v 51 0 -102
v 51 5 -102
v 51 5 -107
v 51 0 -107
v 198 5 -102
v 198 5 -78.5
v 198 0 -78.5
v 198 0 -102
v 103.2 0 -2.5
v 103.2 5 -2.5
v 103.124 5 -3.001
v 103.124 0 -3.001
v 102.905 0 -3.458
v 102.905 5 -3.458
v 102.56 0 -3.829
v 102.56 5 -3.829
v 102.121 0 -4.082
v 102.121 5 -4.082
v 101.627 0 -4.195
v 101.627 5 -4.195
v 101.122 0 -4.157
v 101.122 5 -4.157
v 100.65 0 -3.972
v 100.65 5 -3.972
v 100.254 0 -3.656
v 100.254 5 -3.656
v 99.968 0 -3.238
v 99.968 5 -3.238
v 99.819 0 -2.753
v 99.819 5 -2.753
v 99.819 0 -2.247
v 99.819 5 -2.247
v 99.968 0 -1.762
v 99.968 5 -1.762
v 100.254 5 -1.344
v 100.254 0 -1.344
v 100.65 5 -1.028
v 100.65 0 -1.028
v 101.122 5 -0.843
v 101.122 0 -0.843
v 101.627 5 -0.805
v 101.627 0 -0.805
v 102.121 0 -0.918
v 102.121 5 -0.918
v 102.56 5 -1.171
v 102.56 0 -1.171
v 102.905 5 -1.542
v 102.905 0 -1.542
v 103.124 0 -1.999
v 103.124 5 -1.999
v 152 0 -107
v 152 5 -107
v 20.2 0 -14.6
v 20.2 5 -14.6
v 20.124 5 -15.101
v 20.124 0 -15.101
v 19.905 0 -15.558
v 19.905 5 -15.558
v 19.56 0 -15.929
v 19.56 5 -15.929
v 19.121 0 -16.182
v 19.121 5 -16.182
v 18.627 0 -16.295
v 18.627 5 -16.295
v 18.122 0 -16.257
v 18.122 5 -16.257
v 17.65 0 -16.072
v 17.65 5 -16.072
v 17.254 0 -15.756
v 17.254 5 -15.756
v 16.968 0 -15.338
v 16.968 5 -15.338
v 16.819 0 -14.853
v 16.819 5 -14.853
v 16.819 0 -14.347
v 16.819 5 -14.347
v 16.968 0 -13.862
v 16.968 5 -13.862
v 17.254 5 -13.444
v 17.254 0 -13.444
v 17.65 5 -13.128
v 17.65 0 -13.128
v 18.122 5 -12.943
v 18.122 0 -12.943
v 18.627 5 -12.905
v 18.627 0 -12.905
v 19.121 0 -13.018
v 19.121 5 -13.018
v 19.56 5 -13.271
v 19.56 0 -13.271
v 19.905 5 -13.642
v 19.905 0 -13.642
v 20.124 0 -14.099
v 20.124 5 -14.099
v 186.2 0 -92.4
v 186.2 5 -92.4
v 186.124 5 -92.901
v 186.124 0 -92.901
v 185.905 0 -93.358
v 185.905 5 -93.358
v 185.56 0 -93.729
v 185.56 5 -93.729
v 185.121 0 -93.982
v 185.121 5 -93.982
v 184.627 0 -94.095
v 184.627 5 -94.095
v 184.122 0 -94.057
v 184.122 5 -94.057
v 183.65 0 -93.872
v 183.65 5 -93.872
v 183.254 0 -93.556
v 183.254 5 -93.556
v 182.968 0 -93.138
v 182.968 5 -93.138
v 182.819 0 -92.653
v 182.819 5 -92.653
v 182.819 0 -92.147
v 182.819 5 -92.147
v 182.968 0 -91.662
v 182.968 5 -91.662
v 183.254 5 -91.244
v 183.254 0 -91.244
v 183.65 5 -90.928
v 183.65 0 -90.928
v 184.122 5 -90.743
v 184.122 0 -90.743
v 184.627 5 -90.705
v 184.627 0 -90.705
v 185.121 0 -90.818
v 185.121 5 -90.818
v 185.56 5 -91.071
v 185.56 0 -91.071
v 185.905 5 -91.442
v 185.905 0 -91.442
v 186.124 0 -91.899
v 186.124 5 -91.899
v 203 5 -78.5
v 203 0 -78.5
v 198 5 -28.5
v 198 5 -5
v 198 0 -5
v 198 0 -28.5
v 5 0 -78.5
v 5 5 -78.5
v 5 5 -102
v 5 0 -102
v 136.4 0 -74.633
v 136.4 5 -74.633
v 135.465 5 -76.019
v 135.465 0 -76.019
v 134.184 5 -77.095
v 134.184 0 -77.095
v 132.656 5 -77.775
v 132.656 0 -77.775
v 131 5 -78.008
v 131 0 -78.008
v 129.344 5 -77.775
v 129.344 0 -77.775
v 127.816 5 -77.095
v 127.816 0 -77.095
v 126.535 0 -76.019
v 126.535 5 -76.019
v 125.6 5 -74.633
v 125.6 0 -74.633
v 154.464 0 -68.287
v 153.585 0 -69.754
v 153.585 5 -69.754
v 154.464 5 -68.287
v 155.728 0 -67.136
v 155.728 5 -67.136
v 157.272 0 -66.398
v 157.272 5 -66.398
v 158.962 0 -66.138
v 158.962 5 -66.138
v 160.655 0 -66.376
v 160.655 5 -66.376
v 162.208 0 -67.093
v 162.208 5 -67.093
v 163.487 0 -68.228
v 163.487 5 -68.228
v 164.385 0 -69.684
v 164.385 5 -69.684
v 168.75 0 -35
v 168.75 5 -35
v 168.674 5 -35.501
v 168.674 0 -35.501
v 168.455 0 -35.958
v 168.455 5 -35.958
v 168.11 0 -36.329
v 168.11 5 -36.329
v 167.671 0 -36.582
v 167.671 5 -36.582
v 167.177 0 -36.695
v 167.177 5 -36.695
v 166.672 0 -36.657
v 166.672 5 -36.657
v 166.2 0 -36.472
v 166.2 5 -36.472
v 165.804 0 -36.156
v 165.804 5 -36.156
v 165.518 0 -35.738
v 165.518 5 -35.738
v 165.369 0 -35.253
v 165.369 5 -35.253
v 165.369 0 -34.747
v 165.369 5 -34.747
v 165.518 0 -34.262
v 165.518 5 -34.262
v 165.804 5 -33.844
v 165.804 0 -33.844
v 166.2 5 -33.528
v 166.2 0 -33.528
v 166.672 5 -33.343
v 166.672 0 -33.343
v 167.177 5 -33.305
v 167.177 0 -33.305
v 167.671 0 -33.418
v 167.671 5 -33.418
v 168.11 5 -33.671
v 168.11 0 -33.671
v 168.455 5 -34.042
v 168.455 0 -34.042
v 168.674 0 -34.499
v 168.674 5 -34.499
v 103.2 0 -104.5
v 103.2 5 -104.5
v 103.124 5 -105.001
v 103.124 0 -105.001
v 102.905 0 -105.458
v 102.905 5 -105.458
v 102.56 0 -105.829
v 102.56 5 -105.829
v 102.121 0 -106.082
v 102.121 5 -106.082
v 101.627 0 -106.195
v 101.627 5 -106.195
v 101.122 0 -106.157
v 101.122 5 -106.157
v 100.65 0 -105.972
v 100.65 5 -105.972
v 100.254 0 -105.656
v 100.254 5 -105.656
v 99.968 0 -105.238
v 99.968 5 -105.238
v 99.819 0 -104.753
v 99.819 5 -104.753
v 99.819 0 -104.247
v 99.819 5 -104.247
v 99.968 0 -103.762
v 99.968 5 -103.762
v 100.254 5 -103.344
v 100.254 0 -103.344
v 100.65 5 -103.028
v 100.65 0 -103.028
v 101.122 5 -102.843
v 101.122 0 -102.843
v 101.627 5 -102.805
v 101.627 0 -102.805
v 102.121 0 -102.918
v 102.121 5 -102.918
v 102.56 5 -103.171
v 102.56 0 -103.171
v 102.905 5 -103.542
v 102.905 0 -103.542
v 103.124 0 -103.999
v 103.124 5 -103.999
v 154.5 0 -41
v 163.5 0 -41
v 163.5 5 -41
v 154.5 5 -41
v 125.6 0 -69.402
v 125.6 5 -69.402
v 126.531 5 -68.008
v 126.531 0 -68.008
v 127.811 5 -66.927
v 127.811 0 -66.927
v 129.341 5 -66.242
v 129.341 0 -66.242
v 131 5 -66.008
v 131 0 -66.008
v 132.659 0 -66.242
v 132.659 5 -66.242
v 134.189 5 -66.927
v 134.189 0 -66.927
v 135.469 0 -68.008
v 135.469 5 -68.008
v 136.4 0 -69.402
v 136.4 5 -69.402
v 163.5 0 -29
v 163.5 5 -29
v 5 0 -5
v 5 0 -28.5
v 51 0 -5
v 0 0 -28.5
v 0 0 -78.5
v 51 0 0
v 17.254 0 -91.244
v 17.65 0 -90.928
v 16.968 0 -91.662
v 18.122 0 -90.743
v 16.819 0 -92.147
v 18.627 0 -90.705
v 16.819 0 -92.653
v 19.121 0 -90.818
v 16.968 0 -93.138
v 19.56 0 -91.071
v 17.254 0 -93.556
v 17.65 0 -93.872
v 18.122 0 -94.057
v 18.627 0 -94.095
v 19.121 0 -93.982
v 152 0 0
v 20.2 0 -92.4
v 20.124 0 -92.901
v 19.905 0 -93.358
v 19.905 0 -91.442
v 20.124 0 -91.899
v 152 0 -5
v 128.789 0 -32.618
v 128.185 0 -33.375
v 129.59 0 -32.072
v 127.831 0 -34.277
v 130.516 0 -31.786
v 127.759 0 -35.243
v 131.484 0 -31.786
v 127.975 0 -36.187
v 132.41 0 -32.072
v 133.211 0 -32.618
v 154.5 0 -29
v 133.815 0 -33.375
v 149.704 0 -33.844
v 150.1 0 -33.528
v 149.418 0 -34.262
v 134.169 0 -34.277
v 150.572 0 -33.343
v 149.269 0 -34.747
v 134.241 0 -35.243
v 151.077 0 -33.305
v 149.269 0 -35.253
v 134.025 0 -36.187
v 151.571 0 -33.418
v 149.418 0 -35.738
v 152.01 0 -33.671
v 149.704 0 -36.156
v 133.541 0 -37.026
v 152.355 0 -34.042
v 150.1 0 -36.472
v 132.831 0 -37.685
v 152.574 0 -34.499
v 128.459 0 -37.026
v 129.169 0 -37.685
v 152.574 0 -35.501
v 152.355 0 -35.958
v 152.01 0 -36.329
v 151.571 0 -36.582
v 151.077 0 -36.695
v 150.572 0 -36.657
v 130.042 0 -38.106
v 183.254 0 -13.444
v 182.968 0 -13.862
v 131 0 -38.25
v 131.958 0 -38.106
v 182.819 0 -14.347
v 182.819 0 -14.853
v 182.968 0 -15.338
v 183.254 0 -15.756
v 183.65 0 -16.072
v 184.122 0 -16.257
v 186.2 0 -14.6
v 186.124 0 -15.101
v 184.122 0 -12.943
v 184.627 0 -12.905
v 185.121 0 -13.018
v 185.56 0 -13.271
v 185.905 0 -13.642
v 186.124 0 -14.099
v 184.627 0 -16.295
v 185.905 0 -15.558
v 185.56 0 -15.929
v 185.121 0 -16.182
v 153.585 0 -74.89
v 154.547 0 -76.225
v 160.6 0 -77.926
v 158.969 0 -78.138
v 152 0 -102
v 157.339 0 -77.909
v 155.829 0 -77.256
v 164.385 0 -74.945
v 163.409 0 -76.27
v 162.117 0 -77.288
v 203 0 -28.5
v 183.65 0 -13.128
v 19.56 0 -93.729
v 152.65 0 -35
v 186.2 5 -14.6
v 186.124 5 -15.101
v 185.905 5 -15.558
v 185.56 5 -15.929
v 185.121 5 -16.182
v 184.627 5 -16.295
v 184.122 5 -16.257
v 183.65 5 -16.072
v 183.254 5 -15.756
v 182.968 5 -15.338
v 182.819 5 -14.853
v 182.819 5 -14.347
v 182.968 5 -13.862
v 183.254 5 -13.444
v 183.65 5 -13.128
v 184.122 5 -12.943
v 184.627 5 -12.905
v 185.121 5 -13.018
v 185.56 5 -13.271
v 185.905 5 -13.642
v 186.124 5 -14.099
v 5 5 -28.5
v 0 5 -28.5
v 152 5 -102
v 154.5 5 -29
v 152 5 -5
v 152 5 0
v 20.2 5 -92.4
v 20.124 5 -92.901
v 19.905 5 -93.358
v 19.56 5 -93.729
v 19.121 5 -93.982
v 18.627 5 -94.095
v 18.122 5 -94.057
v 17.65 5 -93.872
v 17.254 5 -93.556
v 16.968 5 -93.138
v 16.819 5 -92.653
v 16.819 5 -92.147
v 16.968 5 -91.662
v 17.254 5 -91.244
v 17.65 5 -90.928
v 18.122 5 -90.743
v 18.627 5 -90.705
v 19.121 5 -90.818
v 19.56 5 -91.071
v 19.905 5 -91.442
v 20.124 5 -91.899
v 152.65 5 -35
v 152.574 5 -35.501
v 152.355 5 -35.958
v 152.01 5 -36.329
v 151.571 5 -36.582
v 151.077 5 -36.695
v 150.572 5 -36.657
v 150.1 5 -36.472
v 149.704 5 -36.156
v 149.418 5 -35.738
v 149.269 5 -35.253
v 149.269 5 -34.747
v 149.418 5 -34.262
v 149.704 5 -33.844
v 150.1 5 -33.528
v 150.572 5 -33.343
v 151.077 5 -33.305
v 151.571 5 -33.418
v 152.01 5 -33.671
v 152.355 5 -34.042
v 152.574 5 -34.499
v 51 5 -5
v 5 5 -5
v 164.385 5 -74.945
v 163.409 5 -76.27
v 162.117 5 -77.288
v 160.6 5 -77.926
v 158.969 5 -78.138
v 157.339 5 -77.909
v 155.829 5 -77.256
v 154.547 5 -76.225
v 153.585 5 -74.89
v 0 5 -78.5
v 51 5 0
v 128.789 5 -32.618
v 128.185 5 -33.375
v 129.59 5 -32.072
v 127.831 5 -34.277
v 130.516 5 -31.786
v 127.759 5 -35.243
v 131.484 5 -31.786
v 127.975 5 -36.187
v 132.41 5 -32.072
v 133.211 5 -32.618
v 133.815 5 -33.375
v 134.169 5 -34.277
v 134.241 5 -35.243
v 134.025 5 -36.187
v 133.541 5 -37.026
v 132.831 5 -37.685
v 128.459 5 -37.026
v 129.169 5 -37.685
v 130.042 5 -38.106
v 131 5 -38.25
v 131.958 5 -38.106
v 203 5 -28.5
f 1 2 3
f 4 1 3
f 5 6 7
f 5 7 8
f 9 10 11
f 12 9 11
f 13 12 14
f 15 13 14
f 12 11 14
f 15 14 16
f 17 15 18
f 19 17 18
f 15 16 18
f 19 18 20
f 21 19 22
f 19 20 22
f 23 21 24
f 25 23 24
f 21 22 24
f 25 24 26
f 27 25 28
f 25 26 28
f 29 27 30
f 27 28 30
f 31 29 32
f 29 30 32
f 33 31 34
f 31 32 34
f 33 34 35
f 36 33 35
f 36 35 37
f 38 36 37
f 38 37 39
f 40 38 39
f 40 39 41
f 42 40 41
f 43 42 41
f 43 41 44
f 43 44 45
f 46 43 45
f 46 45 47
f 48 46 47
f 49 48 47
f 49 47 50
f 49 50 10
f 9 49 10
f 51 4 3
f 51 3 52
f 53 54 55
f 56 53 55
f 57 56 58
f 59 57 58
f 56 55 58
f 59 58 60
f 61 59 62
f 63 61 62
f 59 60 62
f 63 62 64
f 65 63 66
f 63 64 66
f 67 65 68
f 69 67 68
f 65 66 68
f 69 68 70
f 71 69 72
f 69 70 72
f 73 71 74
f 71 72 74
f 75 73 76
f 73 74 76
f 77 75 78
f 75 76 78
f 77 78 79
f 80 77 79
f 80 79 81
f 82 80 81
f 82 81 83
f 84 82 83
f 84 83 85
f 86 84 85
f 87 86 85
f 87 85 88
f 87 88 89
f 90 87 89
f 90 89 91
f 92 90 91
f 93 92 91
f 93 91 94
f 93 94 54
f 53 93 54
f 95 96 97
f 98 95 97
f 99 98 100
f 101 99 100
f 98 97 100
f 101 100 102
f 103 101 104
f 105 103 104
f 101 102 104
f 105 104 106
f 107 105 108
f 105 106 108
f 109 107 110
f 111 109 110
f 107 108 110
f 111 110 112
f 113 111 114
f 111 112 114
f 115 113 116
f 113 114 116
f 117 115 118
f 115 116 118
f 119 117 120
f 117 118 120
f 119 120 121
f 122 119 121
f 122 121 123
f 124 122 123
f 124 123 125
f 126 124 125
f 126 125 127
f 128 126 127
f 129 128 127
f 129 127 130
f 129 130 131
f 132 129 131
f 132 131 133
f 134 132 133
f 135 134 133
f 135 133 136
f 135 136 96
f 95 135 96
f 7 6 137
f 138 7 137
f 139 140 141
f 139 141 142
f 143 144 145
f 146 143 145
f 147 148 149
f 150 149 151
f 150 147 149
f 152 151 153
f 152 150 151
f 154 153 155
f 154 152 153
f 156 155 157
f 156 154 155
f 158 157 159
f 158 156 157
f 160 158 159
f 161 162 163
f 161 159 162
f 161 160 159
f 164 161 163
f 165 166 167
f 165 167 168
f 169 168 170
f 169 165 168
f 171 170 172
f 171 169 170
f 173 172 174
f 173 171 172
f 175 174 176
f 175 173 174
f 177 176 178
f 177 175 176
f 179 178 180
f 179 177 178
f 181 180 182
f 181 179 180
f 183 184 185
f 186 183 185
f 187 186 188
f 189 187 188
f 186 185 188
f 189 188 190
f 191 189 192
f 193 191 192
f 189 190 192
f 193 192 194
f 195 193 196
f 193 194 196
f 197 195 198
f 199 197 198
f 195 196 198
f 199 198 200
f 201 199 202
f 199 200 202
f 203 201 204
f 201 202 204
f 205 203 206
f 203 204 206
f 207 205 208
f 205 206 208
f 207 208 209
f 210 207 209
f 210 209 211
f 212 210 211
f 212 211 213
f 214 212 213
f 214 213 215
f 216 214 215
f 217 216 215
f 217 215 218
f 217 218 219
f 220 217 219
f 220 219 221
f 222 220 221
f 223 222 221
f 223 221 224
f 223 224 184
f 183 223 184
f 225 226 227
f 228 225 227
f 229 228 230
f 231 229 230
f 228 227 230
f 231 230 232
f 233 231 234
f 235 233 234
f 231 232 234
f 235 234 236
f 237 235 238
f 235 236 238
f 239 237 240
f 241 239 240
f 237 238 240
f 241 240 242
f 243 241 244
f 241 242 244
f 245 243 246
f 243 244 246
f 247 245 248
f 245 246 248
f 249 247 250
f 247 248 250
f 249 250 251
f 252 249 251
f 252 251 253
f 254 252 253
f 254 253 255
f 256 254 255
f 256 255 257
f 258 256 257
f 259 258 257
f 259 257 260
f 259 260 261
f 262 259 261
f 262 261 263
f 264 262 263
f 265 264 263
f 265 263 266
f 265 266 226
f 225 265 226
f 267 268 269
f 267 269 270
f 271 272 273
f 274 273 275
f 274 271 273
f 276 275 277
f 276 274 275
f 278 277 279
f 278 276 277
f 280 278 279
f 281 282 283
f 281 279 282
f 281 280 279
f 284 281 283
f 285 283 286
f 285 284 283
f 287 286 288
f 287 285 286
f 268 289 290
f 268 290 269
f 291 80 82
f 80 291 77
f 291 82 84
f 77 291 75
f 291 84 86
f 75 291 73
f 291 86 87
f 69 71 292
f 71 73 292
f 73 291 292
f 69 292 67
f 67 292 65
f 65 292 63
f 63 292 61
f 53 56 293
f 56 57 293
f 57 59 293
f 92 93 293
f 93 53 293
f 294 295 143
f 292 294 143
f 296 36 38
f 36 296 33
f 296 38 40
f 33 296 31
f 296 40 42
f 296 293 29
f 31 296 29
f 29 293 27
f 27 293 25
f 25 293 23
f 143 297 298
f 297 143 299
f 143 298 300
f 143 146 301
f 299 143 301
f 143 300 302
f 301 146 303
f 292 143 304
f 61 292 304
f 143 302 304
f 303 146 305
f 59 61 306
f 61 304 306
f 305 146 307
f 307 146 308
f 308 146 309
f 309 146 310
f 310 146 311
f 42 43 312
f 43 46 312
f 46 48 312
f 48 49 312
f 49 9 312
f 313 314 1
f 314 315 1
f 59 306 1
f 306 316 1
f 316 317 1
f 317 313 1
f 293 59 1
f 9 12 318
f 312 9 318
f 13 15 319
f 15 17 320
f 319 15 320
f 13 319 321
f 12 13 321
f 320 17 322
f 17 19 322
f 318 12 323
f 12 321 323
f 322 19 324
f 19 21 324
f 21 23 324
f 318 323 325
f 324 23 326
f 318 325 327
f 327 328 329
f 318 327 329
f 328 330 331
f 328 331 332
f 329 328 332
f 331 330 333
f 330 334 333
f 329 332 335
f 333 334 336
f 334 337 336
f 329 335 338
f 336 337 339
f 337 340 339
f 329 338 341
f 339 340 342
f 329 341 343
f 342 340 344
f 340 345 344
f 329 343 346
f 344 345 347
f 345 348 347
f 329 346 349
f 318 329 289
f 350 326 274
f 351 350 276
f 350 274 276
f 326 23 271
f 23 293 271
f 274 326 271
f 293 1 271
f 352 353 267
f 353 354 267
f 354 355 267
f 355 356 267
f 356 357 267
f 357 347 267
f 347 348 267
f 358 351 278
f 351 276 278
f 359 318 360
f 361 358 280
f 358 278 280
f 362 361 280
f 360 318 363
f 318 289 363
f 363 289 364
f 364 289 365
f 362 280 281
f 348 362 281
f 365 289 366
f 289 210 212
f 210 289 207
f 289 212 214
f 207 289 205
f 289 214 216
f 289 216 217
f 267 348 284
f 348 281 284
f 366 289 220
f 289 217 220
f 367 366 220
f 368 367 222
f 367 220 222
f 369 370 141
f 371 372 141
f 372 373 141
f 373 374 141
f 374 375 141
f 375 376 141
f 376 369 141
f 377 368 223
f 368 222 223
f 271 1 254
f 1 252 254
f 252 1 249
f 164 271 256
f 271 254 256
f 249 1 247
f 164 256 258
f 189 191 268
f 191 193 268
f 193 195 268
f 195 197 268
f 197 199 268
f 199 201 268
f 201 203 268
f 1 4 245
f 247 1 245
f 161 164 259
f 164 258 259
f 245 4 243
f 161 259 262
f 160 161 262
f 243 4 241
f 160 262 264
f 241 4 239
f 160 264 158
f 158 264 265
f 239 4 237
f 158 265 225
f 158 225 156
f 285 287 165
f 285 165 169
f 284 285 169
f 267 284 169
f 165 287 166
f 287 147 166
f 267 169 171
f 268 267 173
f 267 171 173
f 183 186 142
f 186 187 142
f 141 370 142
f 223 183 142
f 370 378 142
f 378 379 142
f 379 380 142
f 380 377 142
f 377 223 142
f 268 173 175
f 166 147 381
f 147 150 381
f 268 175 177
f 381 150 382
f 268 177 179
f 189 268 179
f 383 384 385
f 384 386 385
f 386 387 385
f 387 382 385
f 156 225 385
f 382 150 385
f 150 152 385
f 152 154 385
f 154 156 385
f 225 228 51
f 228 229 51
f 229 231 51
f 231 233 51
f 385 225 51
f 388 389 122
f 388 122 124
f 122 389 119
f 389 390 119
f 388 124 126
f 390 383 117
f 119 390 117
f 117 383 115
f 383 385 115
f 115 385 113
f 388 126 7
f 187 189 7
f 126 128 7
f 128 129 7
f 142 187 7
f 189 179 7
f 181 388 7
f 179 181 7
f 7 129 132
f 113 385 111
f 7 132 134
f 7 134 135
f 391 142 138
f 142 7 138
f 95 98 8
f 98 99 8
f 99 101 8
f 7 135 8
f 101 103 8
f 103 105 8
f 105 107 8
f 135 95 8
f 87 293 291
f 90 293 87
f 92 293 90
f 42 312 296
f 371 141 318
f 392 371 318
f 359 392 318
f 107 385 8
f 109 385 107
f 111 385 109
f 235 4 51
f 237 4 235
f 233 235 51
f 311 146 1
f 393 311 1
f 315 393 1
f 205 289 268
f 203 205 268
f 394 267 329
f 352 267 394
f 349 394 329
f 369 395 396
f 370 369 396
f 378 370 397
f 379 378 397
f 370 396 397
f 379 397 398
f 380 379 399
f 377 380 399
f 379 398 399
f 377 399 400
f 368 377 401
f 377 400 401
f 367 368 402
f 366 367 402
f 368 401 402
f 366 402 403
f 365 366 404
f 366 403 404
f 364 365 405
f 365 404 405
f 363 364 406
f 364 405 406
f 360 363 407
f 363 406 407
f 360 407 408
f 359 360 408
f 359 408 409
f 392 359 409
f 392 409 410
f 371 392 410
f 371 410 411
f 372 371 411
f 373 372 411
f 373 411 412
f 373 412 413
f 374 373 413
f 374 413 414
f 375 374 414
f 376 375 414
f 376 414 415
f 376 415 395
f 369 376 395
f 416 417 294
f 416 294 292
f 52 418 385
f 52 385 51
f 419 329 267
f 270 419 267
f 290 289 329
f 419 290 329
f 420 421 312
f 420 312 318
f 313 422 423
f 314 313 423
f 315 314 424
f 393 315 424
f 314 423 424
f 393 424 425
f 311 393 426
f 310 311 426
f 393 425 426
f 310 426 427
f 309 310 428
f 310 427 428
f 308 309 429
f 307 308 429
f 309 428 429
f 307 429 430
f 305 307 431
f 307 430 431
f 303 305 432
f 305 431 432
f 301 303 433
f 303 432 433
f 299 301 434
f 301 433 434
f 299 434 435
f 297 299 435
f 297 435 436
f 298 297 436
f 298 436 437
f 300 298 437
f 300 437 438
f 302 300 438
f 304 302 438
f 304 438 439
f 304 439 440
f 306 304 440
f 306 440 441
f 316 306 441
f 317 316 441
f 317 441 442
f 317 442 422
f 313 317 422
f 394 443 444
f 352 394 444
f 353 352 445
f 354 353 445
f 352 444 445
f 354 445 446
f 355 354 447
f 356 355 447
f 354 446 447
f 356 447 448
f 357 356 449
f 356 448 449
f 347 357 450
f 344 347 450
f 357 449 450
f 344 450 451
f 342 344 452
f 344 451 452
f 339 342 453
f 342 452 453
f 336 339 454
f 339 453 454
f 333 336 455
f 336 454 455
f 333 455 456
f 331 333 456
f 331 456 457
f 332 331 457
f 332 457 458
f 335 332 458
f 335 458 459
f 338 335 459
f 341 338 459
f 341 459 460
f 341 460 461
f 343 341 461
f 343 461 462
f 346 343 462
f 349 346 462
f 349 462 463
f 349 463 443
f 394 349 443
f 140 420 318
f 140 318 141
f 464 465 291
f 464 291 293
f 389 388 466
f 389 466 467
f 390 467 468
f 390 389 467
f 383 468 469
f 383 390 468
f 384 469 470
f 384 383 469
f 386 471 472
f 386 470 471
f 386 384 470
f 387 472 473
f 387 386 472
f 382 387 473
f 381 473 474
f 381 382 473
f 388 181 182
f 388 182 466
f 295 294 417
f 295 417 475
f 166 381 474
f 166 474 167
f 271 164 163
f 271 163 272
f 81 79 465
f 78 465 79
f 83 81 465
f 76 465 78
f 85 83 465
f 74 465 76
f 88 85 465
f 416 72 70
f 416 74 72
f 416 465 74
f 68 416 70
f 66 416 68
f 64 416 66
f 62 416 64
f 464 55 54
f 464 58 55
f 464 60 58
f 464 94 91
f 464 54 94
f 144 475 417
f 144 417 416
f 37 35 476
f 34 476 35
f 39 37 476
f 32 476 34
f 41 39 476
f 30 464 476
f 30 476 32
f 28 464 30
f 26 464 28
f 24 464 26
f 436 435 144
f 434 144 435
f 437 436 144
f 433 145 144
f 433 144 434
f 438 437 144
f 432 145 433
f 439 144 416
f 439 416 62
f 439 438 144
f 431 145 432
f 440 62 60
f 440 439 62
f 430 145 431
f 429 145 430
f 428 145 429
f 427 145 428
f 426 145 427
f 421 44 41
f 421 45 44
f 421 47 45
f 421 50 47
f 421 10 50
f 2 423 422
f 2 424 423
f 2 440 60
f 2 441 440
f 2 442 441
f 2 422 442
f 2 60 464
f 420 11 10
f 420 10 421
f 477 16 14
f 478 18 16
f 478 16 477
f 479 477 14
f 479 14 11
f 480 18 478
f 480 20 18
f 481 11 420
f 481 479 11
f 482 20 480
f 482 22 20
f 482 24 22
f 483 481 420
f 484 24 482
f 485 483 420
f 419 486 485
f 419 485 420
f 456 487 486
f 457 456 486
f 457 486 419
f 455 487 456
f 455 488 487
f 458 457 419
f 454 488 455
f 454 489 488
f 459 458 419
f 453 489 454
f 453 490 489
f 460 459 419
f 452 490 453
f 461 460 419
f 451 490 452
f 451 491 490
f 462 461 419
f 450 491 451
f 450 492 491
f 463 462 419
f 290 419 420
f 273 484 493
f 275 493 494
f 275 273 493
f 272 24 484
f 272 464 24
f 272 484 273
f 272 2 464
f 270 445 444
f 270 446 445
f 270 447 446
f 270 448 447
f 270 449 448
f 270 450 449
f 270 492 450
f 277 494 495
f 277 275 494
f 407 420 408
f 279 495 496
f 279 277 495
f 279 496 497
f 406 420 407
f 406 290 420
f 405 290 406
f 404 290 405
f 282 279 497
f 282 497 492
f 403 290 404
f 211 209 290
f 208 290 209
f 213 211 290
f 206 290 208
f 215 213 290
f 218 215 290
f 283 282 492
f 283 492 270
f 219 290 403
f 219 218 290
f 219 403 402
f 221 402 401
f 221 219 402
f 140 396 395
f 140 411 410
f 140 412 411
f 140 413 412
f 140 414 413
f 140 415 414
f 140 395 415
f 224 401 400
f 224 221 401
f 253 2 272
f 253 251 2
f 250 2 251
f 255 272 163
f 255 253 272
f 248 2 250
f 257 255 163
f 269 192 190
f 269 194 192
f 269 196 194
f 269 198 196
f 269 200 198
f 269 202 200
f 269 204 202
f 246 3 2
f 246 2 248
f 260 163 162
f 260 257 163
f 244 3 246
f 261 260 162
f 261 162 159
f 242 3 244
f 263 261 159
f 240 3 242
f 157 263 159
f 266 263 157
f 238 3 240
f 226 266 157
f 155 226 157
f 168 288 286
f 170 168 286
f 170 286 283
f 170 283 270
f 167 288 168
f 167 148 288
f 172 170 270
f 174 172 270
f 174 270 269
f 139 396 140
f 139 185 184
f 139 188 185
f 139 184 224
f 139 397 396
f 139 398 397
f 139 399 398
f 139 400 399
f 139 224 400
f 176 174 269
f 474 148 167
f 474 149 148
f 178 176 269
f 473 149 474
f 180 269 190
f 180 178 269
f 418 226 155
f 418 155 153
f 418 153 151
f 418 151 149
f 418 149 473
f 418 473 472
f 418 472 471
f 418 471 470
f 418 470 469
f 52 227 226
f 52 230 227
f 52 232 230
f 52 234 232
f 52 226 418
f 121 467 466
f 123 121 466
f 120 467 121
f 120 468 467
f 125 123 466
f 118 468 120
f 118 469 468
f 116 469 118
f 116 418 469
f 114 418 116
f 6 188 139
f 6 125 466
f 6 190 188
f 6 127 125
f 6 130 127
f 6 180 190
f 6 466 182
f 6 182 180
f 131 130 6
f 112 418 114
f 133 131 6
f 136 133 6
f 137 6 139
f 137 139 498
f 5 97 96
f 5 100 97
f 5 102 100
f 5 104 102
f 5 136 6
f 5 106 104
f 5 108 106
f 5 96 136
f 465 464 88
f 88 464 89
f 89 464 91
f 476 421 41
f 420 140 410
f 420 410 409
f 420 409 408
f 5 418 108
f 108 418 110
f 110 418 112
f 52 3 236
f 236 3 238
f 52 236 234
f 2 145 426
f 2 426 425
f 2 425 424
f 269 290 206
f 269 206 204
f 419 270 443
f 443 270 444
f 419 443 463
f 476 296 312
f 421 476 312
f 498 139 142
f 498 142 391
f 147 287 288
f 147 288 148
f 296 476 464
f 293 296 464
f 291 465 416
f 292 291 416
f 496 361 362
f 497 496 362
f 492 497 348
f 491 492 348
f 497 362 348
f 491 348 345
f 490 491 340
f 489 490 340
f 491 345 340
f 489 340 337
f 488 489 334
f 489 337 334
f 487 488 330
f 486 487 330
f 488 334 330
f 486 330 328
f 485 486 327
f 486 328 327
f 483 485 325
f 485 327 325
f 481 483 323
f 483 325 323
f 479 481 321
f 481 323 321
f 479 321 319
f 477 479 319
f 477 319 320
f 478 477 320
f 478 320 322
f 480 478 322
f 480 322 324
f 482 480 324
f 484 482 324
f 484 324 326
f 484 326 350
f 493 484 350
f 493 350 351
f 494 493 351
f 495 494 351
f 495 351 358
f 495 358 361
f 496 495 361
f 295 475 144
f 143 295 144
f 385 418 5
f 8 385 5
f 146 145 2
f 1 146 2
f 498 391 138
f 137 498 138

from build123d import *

# Parameters (mm, degrees)
SKETCH1_W            = 203
SKETCH1_H            = 107
BOSS_EXTRUDE1_DEPTH  = 5
SKETCH3_W            = 51
SKETCH3_H            = 5
CUT_EXTRUDE1_DEPTH   = 230.527776097
SKETCH4_W            = 5
SKETCH4_H            = 28.5
CUT_EXTRUDE2_DEPTH   = 230.527776097
CUT_EXTRUDE3_DEPTH   = 230.527776097
SKETCH10_R           = 3.25
CUT_EXTRUDE4_DEPTH   = 230.527776097
M3_CLEARANCE_HOLE1_D = 3.4
SKETCH13_W           = 9
SKETCH13_H           = 12
CUT_EXTRUDE5_DEPTH   = 230.527776097
M3_CLEARANCE_HOLE2_D = 3.4
M3_CLEARANCE_HOLE3_D = 3.4


with BuildPart() as part:
    # Sketch1 → Boss-Extrude1 (new body)
    with BuildSketch(Plane(origin=(0, 0, 0), x_dir=(1, 0, 0), z_dir=(0, 1, 0))):
        with Locations((101.5, 53.5)):
            Rectangle(SKETCH1_W, SKETCH1_H)
    extrude(amount=BOSS_EXTRUDE1_DEPTH)

    # Sketch3 → Cut-Extrude1 (cut, through all)
    with BuildSketch(Plane(origin=(0, 5, 0), x_dir=(1, 0, 0), z_dir=(0, 1, 0))):
        with Locations((25.5, 104.5)):
            Rectangle(SKETCH3_W, SKETCH3_H)
        with Locations((177.5, 104.5)):
            Rectangle(SKETCH3_W, SKETCH3_H)
        with Locations((25.5, 2.5)):
            Rectangle(SKETCH3_W, SKETCH3_H)
        with Locations((177.5, 2.5)):
            Rectangle(SKETCH3_W, SKETCH3_H)
    extrude(amount=-CUT_EXTRUDE1_DEPTH, mode=Mode.SUBTRACT)

    # Sketch4 → Cut-Extrude2 (cut, through all)
    with BuildSketch(Plane(origin=(0, 5, 0), x_dir=(1, 0, 0), z_dir=(0, 1, 0))):
        with Locations((2.5, 92.75)):
            Rectangle(SKETCH4_W, SKETCH4_H)
        with Locations((2.5, 14.25)):
            Rectangle(SKETCH4_W, SKETCH4_H)
        with Locations((200.5, 14.25)):
            Rectangle(SKETCH4_W, SKETCH4_H)
        with Locations((200.5, 92.75)):
            Rectangle(SKETCH4_W, SKETCH4_H)
    extrude(amount=-CUT_EXTRUDE2_DEPTH, mode=Mode.SUBTRACT)

    # Sketch7 → Cut-Extrude3 (cut, through all)
    with BuildSketch(Plane.XZ):
        with BuildLine():
            Line((164.385100742, -69.683506307), (164.385100742, -74.945459))
            ThreePointArc((164.385100742, -74.945459), (158.96865866, -78.137919554), (153.585100742, -74.890312225))
            Line((153.585100742, -74.890312225), (153.585100742, -69.754043843))
            ThreePointArc((153.585100742, -69.754043843), (158.961713268, -66.137919554), (164.385100742, -69.683506307))
        make_face()
        with BuildLine():
            Line((136.4, -69.402295461), (136.4, -74.632878398))
            ThreePointArc((136.4, -74.632878398), (131, -78.007665824), (125.6, -74.632878398))
            Line((125.6, -74.632878398), (125.6, -69.402295461))
            ThreePointArc((125.6, -69.402295461), (131, -66.007665824), (136.4, -69.402295461))
        make_face()
    extrude(amount=-CUT_EXTRUDE3_DEPTH, mode=Mode.SUBTRACT)

    # Sketch10 → Cut-Extrude4 (cut, through all)
    with BuildSketch(Plane.XZ):
        with Locations(Location((131, -35, 0), (0, 0, 270))):
            Circle(SKETCH10_R)
    extrude(amount=-CUT_EXTRUDE4_DEPTH, mode=Mode.SUBTRACT)

    # M3 Clearance Hole1 (through all)
    with Locations(Plane(origin=(0, 0, 0), x_dir=(-1, 0, 0), z_dir=(0, -1, 0))):
        with Locations((-18.5, 14.6), (-184.5, 14.6), (-184.5, 92.4), (-18.5, 92.4)):
            Hole(M3_CLEARANCE_HOLE1_D / 2)

    # Sketch13 → Cut-Extrude5 (cut, through all)
    with BuildSketch(Plane(origin=(0, 0, 0), x_dir=(-1, 0, 0), z_dir=(0, -1, 0))):
        with Locations((-159, 35)):
            Rectangle(SKETCH13_W, SKETCH13_H)
    extrude(amount=-CUT_EXTRUDE5_DEPTH, mode=Mode.SUBTRACT)

    # M3 Clearance Hole2 (through all)
    with Locations(Plane(origin=(0, 0, 0), x_dir=(-1, 0, 0), z_dir=(0, -1, 0))):
        with Locations((-150.95, 35), (-167.05, 35)):
            Hole(M3_CLEARANCE_HOLE2_D / 2)

    # M3 Clearance Hole3 (through all)
    with Locations(Plane(origin=(0, 0, 0), x_dir=(-1, 0, 0), z_dir=(0, -1, 0))):
        with Locations((-101.5, 104.5), (-101.5, 2.5)):
            Hole(M3_CLEARANCE_HOLE3_D / 2)


solid = part.part
